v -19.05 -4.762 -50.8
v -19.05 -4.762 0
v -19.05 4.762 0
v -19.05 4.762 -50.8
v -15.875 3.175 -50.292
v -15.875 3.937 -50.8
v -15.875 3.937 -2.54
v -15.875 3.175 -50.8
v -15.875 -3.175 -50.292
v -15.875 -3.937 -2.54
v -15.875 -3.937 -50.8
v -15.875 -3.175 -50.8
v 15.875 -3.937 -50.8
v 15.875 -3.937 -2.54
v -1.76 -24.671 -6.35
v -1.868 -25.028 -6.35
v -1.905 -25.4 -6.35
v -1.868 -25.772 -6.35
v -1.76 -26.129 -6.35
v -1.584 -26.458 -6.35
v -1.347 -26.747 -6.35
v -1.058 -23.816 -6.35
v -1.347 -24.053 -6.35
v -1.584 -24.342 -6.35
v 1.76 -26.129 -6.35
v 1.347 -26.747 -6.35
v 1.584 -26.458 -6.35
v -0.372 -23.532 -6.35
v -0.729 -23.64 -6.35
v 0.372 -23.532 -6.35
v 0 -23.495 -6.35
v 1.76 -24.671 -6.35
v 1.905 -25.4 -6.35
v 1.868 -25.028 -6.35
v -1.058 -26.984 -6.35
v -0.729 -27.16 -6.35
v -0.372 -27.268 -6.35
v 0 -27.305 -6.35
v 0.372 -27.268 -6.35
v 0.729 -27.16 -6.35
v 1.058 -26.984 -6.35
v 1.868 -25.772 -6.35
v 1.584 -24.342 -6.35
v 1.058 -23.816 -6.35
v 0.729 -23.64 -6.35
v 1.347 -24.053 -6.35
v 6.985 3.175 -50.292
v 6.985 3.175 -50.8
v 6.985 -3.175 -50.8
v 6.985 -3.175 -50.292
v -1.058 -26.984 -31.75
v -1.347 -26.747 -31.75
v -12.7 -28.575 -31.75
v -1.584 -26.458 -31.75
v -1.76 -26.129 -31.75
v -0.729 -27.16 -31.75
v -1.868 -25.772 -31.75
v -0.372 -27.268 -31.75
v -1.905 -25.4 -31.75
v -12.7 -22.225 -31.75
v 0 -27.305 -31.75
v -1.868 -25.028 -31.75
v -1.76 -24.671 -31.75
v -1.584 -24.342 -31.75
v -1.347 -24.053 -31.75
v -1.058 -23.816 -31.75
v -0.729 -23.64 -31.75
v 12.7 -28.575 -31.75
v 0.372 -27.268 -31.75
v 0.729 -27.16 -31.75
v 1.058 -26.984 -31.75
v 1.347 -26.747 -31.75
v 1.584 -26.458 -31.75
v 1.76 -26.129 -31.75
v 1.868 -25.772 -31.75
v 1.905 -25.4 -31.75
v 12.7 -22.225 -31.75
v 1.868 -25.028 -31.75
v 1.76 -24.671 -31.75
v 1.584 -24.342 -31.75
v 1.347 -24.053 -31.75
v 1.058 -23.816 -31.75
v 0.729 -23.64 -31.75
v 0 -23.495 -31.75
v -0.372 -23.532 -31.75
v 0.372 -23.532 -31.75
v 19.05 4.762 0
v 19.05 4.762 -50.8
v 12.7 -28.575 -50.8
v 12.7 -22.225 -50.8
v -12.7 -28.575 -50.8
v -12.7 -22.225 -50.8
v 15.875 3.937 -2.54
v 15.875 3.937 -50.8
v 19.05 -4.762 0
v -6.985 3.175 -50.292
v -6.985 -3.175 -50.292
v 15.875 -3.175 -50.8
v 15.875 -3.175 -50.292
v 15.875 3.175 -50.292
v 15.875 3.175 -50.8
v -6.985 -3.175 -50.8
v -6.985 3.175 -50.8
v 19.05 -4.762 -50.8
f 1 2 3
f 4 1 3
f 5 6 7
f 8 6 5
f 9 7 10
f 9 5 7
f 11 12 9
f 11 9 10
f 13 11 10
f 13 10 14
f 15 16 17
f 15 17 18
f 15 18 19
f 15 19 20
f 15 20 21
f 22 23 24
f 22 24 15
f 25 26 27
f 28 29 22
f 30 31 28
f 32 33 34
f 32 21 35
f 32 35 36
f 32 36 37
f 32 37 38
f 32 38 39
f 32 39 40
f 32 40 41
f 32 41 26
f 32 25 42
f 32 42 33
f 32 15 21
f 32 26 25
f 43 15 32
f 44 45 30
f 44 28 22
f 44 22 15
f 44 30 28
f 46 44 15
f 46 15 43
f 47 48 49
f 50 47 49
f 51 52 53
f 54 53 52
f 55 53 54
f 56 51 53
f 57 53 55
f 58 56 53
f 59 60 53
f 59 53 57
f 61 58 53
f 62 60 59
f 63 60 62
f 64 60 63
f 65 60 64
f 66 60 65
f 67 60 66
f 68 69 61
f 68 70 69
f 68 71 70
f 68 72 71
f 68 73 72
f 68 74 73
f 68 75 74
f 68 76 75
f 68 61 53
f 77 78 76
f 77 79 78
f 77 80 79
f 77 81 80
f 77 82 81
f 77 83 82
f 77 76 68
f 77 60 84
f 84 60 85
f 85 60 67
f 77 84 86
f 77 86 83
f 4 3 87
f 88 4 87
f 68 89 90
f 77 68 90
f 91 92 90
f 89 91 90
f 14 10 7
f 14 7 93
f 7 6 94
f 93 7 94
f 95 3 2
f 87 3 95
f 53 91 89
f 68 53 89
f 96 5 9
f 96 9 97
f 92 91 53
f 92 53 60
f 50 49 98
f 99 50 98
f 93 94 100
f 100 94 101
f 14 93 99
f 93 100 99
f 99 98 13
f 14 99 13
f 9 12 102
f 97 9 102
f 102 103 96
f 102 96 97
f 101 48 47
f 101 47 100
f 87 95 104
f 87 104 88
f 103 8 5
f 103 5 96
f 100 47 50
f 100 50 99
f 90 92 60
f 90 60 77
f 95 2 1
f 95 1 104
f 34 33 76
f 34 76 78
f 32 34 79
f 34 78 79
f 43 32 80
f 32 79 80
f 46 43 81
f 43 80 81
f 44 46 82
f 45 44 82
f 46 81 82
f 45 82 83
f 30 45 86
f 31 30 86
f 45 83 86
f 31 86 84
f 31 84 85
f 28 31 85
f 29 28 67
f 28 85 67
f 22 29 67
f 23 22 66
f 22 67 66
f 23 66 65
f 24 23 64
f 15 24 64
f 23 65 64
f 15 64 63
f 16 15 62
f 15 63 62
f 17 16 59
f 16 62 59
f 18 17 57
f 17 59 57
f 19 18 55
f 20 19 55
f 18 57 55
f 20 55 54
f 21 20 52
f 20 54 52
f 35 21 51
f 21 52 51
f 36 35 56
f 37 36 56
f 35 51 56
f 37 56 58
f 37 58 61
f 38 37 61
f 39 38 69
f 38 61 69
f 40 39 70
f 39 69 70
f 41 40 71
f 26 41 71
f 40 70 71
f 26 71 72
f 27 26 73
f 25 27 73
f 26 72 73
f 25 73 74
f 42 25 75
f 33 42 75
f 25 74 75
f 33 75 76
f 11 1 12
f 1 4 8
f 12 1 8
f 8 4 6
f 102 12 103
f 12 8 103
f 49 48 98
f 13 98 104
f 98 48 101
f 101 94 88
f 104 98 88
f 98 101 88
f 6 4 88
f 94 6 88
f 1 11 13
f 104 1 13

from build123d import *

# Parameters (mm, degrees)
F0_W      = 38.1
F0_H      = 9.525
F3_DEPTH  = 50.8
F2_W      = 31.75
F2_H      = 6.35
F4_DEPTH  = 47.752
F5_W      = 13.97
F5_H      = 6.35
F6_DEPTH  = 25.4
F7_W      = 31.75
F7_H      = 0.762
F8_DEPTH  = 48.26
F10_W     = 25.4
F10_H     = 6.35
F11_DEPTH = 19.05
F12_R     = 1.905
F13_DEPTH = 25.4


with BuildPart() as f3:
    # F0 (on Top) → F3 (new body)
    with BuildSketch(Plane.XY):
        Rectangle(F0_W, F0_H)
    extrude(amount=-F3_DEPTH)

    # F2 (on offset) → F4 (cut)
    with BuildSketch(Plane.XY.offset(-2.54)):
        Rectangle(F2_W, F2_H)
    extrude(amount=-F4_DEPTH, mode=Mode.SUBTRACT)

    # F5 (on face) → F6 (cut)
    with BuildSketch(Plane(origin=(0, 0, -50.8), x_dir=(1, 0, 0), z_dir=(0, 0, -1))):
        Rectangle(F5_W, F5_H)
    extrude(amount=-F6_DEPTH, mode=Mode.SUBTRACT)

    # F7 (on face) → F8 (cut)
    with BuildSketch(Plane(origin=(0, 0, -50.8), x_dir=(1, 0, 0), z_dir=(0, 0, -1))):
        with Locations((0, 3.556)):
            Rectangle(F7_W, F7_H)
        with Locations((0, -3.556)):
            Rectangle(F7_W, F7_H)
    extrude(amount=-F8_DEPTH, mode=Mode.SUBTRACT)


with BuildPart() as f11:
    # F10 (on offset) → F11 (new body)
    with BuildSketch(Plane.XY.offset(-50.8)):
        with Locations((0, -25.4)):
            Rectangle(F10_W, F10_H)
    extrude(amount=F11_DEPTH)

    # F12 (on face) → F13 (join)
    with BuildSketch(Plane.XY.offset(-31.75)):
        with Locations((0, -25.4)):
            Circle(F12_R)
    extrude(amount=F13_DEPTH)


solid = Compound([f3.part, f11.part])
